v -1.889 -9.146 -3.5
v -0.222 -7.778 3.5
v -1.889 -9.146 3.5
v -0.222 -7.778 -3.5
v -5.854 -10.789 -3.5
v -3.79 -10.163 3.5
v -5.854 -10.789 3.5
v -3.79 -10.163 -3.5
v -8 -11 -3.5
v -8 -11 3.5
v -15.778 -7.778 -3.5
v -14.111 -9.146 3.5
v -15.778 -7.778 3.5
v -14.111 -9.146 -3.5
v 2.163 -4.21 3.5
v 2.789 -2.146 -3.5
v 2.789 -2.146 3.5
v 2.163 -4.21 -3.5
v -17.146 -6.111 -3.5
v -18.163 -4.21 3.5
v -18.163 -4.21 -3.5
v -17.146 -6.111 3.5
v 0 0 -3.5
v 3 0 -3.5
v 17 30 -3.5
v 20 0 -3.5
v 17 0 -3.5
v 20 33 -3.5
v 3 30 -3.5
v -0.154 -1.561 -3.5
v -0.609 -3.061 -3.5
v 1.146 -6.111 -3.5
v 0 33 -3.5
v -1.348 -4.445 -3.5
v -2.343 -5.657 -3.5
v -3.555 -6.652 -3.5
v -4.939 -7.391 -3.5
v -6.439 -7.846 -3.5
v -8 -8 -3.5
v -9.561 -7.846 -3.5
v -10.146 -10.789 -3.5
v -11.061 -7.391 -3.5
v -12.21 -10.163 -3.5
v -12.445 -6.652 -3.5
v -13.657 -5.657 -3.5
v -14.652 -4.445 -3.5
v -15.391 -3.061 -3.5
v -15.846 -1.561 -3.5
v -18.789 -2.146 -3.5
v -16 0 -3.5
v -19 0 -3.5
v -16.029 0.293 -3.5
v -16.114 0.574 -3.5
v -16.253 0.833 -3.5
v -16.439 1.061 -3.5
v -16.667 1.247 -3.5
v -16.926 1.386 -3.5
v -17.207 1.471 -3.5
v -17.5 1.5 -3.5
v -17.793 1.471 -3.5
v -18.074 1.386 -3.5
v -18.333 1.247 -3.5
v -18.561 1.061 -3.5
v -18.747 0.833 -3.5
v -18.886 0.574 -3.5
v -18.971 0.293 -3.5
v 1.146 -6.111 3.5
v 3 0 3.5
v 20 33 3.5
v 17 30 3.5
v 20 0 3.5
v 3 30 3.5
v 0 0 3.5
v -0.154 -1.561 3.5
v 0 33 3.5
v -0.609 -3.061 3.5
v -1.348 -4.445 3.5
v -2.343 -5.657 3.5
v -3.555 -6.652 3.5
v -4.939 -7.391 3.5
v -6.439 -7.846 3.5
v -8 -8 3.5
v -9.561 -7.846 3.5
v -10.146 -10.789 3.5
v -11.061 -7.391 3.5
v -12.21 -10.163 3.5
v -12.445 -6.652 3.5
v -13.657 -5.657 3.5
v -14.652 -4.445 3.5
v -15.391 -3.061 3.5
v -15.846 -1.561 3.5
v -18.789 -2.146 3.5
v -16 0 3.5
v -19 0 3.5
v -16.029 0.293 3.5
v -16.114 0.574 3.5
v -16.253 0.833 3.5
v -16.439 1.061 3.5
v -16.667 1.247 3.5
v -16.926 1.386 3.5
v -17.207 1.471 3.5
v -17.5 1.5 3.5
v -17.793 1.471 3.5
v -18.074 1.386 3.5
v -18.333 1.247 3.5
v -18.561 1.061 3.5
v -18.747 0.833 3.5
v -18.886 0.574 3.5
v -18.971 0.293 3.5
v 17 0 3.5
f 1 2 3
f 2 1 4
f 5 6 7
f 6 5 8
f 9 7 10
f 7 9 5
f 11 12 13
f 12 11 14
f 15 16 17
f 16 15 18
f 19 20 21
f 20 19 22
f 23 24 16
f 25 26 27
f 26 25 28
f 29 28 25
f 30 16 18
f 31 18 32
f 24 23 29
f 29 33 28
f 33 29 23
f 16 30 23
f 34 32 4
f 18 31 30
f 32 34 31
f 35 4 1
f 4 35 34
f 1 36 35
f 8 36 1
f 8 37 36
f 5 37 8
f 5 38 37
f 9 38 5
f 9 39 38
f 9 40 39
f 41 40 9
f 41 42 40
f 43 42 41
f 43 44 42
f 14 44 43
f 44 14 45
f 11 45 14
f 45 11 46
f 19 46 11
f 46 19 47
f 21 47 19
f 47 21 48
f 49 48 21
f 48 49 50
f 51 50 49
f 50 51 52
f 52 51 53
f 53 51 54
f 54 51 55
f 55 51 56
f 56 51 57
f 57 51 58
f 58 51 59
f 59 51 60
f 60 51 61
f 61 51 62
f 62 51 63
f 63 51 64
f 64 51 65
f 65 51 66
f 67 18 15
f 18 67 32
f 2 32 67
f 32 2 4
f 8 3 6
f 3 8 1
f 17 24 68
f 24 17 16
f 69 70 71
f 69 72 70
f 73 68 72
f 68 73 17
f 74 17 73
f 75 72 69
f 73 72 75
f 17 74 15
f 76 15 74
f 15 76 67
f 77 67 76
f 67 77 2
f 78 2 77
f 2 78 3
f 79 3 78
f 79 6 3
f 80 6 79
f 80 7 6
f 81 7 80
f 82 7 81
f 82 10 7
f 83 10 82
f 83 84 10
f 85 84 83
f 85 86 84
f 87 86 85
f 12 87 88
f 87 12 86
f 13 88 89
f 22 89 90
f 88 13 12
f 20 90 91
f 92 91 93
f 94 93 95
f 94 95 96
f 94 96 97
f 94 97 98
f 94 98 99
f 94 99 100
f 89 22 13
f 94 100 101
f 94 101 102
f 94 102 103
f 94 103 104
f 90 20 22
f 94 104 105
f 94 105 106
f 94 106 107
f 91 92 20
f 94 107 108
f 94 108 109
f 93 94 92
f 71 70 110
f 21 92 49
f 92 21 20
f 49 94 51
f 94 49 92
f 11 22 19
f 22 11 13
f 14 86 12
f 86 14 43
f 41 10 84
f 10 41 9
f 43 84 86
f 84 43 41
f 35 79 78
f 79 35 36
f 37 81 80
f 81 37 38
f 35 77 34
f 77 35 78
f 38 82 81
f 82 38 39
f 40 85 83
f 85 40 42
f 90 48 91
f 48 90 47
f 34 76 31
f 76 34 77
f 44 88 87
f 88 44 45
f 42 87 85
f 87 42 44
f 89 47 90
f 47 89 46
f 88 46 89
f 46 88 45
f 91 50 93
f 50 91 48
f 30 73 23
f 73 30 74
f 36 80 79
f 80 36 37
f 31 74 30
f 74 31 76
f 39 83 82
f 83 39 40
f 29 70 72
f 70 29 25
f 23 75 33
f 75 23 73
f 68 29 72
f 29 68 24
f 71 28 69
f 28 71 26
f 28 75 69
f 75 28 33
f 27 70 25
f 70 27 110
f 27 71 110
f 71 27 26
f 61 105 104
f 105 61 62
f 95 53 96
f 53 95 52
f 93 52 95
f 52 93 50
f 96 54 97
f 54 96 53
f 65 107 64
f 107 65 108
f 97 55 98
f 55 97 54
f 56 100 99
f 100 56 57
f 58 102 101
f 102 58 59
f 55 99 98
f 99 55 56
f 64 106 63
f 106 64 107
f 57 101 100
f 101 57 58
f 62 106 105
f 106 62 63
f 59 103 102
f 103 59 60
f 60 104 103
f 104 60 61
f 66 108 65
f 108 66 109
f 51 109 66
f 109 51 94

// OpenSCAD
//use <tyler.scad>;

$fn=32*1;

E=0.05*1;

// Thickness of the part that goes over whatever you're hanging it on. (mm)
lip_thickness = 7;

// Thickness of the hook part. (mm)
hook_thickness = 7;

// Width of the hook; also basically sets its strength. (mm)
width = 3; 

// Height of the stem, i.e. the vertical part on the hook side. (mm)
stem_height = 30;

// How large is the actual hook part, measured as the diameter of the inside of the hook. (mm)
hook_diameter = 16; 

// How thick is the thing you're hanging the hook on? (mm)
lip_length = 14; 

// Height of the back part of the hook. (mm)
lip_height = 30;

hook_radius = hook_diameter/2;

//stem
cube2([width,stem_height+width,hook_thickness],aligns="LLC");

// hook
translate([-hook_radius,0,0]) {
    difference() {
        cylinder(r=hook_radius+width,h=hook_thickness,center=true);
        cylinder(r=hook_radius,h=hook_thickness+2*E,center=true);
        cube2([hook_diameter+2*width+E,hook_radius+width+E,hook_thickness+2*E],aligns="CLC");
    }
}
// rounded hook end
translate([-hook_diameter-width/2,0,0]) cylinder(d=width, h=hook_thickness, center=true); 


// lip
translate([0,stem_height,0]) {
    rotate([0,90,0]) linear_extrude(width) arc(r=lip_thickness/2, a1=180, a2=0);
    
    translate([0,width,0]) cube2([lip_length+width+width,width,lip_thickness],aligns="LRC");
    
    translate([lip_length+width,width,0]) cube2([width,lip_height+width,lip_thickness],aligns="LRC");
    
}


module cube2(size,aligns="LLL",radius=0,xy_radius=0) {
    real_size = len(size) ? size : [size,size,size];
    tr = [
        aligns[0]=="C" ? 0 : aligns[0]=="R" ? (-real_size[0]/2) : (+real_size[0]/2),
        aligns[1]=="C" ? 0 : aligns[1]=="R" ? (-real_size[1]/2) : (+real_size[1]/2),
        aligns[2]=="C" ? 0 : aligns[2]=="R" ? (-real_size[2]/2) : (+real_size[2]/2)
    ];
    translate(tr) {
        if (xy_radius>0) {
            inner_size = [for (v=real_size) v-min(xy_radius*2,v)];
            linear_extrude(real_size[2], center=true) offset(r=xy_radius) square([inner_size[0],inner_size[1]], center=true);
        } else if (radius>0) {
            if (radius*2 >= max(real_size)) {
                resize(real_size) sphere(1);
            } else {
                inner_size = [for (v=real_size) v-min(radius*2,v)];
                minkowski() {
                    cube(inner_size,center=true);
                    sphere(r=radius);
                }
            }
        } else {
            cube(real_size,center=true);
        }
    } 
}

module arc(r,a1,a2,ir=0) {
    // normalize to 0..360 (even for negatives)
    a1n = (a1 % 360 + 360) % 360; 
    a2n = (a2 % 360 + 360) % 360;
    difference() {
        circle(r);
        if (ir != 0) circle(ir); // if inner radius given, subtract it away
            
        // get the a1 to interpolate to, adding a revolution if going the long way
        a1next = a2n>a1n ? a1n + 360 : a1n; 
        
        polygon([
            [0,0],
            [cos(1.00*a2n + 0.00*a1next)*2*r,sin(1.00*a2n + 0.00*a1next)*2*r],
            [cos(0.66*a2n + 0.33*a1next)*2*r,sin(0.66*a2n + 0.33*a1next)*2*r],
            [cos(0.33*a2n + 0.66*a1next)*2*r,sin(0.33*a2n + 0.66*a1next)*2*r],
            [cos(0.00*a2n + 1.00*a1next)*2*r,sin(0.00*a2n + 1.00*a1next)*2*r],
        ]);
    }
}


